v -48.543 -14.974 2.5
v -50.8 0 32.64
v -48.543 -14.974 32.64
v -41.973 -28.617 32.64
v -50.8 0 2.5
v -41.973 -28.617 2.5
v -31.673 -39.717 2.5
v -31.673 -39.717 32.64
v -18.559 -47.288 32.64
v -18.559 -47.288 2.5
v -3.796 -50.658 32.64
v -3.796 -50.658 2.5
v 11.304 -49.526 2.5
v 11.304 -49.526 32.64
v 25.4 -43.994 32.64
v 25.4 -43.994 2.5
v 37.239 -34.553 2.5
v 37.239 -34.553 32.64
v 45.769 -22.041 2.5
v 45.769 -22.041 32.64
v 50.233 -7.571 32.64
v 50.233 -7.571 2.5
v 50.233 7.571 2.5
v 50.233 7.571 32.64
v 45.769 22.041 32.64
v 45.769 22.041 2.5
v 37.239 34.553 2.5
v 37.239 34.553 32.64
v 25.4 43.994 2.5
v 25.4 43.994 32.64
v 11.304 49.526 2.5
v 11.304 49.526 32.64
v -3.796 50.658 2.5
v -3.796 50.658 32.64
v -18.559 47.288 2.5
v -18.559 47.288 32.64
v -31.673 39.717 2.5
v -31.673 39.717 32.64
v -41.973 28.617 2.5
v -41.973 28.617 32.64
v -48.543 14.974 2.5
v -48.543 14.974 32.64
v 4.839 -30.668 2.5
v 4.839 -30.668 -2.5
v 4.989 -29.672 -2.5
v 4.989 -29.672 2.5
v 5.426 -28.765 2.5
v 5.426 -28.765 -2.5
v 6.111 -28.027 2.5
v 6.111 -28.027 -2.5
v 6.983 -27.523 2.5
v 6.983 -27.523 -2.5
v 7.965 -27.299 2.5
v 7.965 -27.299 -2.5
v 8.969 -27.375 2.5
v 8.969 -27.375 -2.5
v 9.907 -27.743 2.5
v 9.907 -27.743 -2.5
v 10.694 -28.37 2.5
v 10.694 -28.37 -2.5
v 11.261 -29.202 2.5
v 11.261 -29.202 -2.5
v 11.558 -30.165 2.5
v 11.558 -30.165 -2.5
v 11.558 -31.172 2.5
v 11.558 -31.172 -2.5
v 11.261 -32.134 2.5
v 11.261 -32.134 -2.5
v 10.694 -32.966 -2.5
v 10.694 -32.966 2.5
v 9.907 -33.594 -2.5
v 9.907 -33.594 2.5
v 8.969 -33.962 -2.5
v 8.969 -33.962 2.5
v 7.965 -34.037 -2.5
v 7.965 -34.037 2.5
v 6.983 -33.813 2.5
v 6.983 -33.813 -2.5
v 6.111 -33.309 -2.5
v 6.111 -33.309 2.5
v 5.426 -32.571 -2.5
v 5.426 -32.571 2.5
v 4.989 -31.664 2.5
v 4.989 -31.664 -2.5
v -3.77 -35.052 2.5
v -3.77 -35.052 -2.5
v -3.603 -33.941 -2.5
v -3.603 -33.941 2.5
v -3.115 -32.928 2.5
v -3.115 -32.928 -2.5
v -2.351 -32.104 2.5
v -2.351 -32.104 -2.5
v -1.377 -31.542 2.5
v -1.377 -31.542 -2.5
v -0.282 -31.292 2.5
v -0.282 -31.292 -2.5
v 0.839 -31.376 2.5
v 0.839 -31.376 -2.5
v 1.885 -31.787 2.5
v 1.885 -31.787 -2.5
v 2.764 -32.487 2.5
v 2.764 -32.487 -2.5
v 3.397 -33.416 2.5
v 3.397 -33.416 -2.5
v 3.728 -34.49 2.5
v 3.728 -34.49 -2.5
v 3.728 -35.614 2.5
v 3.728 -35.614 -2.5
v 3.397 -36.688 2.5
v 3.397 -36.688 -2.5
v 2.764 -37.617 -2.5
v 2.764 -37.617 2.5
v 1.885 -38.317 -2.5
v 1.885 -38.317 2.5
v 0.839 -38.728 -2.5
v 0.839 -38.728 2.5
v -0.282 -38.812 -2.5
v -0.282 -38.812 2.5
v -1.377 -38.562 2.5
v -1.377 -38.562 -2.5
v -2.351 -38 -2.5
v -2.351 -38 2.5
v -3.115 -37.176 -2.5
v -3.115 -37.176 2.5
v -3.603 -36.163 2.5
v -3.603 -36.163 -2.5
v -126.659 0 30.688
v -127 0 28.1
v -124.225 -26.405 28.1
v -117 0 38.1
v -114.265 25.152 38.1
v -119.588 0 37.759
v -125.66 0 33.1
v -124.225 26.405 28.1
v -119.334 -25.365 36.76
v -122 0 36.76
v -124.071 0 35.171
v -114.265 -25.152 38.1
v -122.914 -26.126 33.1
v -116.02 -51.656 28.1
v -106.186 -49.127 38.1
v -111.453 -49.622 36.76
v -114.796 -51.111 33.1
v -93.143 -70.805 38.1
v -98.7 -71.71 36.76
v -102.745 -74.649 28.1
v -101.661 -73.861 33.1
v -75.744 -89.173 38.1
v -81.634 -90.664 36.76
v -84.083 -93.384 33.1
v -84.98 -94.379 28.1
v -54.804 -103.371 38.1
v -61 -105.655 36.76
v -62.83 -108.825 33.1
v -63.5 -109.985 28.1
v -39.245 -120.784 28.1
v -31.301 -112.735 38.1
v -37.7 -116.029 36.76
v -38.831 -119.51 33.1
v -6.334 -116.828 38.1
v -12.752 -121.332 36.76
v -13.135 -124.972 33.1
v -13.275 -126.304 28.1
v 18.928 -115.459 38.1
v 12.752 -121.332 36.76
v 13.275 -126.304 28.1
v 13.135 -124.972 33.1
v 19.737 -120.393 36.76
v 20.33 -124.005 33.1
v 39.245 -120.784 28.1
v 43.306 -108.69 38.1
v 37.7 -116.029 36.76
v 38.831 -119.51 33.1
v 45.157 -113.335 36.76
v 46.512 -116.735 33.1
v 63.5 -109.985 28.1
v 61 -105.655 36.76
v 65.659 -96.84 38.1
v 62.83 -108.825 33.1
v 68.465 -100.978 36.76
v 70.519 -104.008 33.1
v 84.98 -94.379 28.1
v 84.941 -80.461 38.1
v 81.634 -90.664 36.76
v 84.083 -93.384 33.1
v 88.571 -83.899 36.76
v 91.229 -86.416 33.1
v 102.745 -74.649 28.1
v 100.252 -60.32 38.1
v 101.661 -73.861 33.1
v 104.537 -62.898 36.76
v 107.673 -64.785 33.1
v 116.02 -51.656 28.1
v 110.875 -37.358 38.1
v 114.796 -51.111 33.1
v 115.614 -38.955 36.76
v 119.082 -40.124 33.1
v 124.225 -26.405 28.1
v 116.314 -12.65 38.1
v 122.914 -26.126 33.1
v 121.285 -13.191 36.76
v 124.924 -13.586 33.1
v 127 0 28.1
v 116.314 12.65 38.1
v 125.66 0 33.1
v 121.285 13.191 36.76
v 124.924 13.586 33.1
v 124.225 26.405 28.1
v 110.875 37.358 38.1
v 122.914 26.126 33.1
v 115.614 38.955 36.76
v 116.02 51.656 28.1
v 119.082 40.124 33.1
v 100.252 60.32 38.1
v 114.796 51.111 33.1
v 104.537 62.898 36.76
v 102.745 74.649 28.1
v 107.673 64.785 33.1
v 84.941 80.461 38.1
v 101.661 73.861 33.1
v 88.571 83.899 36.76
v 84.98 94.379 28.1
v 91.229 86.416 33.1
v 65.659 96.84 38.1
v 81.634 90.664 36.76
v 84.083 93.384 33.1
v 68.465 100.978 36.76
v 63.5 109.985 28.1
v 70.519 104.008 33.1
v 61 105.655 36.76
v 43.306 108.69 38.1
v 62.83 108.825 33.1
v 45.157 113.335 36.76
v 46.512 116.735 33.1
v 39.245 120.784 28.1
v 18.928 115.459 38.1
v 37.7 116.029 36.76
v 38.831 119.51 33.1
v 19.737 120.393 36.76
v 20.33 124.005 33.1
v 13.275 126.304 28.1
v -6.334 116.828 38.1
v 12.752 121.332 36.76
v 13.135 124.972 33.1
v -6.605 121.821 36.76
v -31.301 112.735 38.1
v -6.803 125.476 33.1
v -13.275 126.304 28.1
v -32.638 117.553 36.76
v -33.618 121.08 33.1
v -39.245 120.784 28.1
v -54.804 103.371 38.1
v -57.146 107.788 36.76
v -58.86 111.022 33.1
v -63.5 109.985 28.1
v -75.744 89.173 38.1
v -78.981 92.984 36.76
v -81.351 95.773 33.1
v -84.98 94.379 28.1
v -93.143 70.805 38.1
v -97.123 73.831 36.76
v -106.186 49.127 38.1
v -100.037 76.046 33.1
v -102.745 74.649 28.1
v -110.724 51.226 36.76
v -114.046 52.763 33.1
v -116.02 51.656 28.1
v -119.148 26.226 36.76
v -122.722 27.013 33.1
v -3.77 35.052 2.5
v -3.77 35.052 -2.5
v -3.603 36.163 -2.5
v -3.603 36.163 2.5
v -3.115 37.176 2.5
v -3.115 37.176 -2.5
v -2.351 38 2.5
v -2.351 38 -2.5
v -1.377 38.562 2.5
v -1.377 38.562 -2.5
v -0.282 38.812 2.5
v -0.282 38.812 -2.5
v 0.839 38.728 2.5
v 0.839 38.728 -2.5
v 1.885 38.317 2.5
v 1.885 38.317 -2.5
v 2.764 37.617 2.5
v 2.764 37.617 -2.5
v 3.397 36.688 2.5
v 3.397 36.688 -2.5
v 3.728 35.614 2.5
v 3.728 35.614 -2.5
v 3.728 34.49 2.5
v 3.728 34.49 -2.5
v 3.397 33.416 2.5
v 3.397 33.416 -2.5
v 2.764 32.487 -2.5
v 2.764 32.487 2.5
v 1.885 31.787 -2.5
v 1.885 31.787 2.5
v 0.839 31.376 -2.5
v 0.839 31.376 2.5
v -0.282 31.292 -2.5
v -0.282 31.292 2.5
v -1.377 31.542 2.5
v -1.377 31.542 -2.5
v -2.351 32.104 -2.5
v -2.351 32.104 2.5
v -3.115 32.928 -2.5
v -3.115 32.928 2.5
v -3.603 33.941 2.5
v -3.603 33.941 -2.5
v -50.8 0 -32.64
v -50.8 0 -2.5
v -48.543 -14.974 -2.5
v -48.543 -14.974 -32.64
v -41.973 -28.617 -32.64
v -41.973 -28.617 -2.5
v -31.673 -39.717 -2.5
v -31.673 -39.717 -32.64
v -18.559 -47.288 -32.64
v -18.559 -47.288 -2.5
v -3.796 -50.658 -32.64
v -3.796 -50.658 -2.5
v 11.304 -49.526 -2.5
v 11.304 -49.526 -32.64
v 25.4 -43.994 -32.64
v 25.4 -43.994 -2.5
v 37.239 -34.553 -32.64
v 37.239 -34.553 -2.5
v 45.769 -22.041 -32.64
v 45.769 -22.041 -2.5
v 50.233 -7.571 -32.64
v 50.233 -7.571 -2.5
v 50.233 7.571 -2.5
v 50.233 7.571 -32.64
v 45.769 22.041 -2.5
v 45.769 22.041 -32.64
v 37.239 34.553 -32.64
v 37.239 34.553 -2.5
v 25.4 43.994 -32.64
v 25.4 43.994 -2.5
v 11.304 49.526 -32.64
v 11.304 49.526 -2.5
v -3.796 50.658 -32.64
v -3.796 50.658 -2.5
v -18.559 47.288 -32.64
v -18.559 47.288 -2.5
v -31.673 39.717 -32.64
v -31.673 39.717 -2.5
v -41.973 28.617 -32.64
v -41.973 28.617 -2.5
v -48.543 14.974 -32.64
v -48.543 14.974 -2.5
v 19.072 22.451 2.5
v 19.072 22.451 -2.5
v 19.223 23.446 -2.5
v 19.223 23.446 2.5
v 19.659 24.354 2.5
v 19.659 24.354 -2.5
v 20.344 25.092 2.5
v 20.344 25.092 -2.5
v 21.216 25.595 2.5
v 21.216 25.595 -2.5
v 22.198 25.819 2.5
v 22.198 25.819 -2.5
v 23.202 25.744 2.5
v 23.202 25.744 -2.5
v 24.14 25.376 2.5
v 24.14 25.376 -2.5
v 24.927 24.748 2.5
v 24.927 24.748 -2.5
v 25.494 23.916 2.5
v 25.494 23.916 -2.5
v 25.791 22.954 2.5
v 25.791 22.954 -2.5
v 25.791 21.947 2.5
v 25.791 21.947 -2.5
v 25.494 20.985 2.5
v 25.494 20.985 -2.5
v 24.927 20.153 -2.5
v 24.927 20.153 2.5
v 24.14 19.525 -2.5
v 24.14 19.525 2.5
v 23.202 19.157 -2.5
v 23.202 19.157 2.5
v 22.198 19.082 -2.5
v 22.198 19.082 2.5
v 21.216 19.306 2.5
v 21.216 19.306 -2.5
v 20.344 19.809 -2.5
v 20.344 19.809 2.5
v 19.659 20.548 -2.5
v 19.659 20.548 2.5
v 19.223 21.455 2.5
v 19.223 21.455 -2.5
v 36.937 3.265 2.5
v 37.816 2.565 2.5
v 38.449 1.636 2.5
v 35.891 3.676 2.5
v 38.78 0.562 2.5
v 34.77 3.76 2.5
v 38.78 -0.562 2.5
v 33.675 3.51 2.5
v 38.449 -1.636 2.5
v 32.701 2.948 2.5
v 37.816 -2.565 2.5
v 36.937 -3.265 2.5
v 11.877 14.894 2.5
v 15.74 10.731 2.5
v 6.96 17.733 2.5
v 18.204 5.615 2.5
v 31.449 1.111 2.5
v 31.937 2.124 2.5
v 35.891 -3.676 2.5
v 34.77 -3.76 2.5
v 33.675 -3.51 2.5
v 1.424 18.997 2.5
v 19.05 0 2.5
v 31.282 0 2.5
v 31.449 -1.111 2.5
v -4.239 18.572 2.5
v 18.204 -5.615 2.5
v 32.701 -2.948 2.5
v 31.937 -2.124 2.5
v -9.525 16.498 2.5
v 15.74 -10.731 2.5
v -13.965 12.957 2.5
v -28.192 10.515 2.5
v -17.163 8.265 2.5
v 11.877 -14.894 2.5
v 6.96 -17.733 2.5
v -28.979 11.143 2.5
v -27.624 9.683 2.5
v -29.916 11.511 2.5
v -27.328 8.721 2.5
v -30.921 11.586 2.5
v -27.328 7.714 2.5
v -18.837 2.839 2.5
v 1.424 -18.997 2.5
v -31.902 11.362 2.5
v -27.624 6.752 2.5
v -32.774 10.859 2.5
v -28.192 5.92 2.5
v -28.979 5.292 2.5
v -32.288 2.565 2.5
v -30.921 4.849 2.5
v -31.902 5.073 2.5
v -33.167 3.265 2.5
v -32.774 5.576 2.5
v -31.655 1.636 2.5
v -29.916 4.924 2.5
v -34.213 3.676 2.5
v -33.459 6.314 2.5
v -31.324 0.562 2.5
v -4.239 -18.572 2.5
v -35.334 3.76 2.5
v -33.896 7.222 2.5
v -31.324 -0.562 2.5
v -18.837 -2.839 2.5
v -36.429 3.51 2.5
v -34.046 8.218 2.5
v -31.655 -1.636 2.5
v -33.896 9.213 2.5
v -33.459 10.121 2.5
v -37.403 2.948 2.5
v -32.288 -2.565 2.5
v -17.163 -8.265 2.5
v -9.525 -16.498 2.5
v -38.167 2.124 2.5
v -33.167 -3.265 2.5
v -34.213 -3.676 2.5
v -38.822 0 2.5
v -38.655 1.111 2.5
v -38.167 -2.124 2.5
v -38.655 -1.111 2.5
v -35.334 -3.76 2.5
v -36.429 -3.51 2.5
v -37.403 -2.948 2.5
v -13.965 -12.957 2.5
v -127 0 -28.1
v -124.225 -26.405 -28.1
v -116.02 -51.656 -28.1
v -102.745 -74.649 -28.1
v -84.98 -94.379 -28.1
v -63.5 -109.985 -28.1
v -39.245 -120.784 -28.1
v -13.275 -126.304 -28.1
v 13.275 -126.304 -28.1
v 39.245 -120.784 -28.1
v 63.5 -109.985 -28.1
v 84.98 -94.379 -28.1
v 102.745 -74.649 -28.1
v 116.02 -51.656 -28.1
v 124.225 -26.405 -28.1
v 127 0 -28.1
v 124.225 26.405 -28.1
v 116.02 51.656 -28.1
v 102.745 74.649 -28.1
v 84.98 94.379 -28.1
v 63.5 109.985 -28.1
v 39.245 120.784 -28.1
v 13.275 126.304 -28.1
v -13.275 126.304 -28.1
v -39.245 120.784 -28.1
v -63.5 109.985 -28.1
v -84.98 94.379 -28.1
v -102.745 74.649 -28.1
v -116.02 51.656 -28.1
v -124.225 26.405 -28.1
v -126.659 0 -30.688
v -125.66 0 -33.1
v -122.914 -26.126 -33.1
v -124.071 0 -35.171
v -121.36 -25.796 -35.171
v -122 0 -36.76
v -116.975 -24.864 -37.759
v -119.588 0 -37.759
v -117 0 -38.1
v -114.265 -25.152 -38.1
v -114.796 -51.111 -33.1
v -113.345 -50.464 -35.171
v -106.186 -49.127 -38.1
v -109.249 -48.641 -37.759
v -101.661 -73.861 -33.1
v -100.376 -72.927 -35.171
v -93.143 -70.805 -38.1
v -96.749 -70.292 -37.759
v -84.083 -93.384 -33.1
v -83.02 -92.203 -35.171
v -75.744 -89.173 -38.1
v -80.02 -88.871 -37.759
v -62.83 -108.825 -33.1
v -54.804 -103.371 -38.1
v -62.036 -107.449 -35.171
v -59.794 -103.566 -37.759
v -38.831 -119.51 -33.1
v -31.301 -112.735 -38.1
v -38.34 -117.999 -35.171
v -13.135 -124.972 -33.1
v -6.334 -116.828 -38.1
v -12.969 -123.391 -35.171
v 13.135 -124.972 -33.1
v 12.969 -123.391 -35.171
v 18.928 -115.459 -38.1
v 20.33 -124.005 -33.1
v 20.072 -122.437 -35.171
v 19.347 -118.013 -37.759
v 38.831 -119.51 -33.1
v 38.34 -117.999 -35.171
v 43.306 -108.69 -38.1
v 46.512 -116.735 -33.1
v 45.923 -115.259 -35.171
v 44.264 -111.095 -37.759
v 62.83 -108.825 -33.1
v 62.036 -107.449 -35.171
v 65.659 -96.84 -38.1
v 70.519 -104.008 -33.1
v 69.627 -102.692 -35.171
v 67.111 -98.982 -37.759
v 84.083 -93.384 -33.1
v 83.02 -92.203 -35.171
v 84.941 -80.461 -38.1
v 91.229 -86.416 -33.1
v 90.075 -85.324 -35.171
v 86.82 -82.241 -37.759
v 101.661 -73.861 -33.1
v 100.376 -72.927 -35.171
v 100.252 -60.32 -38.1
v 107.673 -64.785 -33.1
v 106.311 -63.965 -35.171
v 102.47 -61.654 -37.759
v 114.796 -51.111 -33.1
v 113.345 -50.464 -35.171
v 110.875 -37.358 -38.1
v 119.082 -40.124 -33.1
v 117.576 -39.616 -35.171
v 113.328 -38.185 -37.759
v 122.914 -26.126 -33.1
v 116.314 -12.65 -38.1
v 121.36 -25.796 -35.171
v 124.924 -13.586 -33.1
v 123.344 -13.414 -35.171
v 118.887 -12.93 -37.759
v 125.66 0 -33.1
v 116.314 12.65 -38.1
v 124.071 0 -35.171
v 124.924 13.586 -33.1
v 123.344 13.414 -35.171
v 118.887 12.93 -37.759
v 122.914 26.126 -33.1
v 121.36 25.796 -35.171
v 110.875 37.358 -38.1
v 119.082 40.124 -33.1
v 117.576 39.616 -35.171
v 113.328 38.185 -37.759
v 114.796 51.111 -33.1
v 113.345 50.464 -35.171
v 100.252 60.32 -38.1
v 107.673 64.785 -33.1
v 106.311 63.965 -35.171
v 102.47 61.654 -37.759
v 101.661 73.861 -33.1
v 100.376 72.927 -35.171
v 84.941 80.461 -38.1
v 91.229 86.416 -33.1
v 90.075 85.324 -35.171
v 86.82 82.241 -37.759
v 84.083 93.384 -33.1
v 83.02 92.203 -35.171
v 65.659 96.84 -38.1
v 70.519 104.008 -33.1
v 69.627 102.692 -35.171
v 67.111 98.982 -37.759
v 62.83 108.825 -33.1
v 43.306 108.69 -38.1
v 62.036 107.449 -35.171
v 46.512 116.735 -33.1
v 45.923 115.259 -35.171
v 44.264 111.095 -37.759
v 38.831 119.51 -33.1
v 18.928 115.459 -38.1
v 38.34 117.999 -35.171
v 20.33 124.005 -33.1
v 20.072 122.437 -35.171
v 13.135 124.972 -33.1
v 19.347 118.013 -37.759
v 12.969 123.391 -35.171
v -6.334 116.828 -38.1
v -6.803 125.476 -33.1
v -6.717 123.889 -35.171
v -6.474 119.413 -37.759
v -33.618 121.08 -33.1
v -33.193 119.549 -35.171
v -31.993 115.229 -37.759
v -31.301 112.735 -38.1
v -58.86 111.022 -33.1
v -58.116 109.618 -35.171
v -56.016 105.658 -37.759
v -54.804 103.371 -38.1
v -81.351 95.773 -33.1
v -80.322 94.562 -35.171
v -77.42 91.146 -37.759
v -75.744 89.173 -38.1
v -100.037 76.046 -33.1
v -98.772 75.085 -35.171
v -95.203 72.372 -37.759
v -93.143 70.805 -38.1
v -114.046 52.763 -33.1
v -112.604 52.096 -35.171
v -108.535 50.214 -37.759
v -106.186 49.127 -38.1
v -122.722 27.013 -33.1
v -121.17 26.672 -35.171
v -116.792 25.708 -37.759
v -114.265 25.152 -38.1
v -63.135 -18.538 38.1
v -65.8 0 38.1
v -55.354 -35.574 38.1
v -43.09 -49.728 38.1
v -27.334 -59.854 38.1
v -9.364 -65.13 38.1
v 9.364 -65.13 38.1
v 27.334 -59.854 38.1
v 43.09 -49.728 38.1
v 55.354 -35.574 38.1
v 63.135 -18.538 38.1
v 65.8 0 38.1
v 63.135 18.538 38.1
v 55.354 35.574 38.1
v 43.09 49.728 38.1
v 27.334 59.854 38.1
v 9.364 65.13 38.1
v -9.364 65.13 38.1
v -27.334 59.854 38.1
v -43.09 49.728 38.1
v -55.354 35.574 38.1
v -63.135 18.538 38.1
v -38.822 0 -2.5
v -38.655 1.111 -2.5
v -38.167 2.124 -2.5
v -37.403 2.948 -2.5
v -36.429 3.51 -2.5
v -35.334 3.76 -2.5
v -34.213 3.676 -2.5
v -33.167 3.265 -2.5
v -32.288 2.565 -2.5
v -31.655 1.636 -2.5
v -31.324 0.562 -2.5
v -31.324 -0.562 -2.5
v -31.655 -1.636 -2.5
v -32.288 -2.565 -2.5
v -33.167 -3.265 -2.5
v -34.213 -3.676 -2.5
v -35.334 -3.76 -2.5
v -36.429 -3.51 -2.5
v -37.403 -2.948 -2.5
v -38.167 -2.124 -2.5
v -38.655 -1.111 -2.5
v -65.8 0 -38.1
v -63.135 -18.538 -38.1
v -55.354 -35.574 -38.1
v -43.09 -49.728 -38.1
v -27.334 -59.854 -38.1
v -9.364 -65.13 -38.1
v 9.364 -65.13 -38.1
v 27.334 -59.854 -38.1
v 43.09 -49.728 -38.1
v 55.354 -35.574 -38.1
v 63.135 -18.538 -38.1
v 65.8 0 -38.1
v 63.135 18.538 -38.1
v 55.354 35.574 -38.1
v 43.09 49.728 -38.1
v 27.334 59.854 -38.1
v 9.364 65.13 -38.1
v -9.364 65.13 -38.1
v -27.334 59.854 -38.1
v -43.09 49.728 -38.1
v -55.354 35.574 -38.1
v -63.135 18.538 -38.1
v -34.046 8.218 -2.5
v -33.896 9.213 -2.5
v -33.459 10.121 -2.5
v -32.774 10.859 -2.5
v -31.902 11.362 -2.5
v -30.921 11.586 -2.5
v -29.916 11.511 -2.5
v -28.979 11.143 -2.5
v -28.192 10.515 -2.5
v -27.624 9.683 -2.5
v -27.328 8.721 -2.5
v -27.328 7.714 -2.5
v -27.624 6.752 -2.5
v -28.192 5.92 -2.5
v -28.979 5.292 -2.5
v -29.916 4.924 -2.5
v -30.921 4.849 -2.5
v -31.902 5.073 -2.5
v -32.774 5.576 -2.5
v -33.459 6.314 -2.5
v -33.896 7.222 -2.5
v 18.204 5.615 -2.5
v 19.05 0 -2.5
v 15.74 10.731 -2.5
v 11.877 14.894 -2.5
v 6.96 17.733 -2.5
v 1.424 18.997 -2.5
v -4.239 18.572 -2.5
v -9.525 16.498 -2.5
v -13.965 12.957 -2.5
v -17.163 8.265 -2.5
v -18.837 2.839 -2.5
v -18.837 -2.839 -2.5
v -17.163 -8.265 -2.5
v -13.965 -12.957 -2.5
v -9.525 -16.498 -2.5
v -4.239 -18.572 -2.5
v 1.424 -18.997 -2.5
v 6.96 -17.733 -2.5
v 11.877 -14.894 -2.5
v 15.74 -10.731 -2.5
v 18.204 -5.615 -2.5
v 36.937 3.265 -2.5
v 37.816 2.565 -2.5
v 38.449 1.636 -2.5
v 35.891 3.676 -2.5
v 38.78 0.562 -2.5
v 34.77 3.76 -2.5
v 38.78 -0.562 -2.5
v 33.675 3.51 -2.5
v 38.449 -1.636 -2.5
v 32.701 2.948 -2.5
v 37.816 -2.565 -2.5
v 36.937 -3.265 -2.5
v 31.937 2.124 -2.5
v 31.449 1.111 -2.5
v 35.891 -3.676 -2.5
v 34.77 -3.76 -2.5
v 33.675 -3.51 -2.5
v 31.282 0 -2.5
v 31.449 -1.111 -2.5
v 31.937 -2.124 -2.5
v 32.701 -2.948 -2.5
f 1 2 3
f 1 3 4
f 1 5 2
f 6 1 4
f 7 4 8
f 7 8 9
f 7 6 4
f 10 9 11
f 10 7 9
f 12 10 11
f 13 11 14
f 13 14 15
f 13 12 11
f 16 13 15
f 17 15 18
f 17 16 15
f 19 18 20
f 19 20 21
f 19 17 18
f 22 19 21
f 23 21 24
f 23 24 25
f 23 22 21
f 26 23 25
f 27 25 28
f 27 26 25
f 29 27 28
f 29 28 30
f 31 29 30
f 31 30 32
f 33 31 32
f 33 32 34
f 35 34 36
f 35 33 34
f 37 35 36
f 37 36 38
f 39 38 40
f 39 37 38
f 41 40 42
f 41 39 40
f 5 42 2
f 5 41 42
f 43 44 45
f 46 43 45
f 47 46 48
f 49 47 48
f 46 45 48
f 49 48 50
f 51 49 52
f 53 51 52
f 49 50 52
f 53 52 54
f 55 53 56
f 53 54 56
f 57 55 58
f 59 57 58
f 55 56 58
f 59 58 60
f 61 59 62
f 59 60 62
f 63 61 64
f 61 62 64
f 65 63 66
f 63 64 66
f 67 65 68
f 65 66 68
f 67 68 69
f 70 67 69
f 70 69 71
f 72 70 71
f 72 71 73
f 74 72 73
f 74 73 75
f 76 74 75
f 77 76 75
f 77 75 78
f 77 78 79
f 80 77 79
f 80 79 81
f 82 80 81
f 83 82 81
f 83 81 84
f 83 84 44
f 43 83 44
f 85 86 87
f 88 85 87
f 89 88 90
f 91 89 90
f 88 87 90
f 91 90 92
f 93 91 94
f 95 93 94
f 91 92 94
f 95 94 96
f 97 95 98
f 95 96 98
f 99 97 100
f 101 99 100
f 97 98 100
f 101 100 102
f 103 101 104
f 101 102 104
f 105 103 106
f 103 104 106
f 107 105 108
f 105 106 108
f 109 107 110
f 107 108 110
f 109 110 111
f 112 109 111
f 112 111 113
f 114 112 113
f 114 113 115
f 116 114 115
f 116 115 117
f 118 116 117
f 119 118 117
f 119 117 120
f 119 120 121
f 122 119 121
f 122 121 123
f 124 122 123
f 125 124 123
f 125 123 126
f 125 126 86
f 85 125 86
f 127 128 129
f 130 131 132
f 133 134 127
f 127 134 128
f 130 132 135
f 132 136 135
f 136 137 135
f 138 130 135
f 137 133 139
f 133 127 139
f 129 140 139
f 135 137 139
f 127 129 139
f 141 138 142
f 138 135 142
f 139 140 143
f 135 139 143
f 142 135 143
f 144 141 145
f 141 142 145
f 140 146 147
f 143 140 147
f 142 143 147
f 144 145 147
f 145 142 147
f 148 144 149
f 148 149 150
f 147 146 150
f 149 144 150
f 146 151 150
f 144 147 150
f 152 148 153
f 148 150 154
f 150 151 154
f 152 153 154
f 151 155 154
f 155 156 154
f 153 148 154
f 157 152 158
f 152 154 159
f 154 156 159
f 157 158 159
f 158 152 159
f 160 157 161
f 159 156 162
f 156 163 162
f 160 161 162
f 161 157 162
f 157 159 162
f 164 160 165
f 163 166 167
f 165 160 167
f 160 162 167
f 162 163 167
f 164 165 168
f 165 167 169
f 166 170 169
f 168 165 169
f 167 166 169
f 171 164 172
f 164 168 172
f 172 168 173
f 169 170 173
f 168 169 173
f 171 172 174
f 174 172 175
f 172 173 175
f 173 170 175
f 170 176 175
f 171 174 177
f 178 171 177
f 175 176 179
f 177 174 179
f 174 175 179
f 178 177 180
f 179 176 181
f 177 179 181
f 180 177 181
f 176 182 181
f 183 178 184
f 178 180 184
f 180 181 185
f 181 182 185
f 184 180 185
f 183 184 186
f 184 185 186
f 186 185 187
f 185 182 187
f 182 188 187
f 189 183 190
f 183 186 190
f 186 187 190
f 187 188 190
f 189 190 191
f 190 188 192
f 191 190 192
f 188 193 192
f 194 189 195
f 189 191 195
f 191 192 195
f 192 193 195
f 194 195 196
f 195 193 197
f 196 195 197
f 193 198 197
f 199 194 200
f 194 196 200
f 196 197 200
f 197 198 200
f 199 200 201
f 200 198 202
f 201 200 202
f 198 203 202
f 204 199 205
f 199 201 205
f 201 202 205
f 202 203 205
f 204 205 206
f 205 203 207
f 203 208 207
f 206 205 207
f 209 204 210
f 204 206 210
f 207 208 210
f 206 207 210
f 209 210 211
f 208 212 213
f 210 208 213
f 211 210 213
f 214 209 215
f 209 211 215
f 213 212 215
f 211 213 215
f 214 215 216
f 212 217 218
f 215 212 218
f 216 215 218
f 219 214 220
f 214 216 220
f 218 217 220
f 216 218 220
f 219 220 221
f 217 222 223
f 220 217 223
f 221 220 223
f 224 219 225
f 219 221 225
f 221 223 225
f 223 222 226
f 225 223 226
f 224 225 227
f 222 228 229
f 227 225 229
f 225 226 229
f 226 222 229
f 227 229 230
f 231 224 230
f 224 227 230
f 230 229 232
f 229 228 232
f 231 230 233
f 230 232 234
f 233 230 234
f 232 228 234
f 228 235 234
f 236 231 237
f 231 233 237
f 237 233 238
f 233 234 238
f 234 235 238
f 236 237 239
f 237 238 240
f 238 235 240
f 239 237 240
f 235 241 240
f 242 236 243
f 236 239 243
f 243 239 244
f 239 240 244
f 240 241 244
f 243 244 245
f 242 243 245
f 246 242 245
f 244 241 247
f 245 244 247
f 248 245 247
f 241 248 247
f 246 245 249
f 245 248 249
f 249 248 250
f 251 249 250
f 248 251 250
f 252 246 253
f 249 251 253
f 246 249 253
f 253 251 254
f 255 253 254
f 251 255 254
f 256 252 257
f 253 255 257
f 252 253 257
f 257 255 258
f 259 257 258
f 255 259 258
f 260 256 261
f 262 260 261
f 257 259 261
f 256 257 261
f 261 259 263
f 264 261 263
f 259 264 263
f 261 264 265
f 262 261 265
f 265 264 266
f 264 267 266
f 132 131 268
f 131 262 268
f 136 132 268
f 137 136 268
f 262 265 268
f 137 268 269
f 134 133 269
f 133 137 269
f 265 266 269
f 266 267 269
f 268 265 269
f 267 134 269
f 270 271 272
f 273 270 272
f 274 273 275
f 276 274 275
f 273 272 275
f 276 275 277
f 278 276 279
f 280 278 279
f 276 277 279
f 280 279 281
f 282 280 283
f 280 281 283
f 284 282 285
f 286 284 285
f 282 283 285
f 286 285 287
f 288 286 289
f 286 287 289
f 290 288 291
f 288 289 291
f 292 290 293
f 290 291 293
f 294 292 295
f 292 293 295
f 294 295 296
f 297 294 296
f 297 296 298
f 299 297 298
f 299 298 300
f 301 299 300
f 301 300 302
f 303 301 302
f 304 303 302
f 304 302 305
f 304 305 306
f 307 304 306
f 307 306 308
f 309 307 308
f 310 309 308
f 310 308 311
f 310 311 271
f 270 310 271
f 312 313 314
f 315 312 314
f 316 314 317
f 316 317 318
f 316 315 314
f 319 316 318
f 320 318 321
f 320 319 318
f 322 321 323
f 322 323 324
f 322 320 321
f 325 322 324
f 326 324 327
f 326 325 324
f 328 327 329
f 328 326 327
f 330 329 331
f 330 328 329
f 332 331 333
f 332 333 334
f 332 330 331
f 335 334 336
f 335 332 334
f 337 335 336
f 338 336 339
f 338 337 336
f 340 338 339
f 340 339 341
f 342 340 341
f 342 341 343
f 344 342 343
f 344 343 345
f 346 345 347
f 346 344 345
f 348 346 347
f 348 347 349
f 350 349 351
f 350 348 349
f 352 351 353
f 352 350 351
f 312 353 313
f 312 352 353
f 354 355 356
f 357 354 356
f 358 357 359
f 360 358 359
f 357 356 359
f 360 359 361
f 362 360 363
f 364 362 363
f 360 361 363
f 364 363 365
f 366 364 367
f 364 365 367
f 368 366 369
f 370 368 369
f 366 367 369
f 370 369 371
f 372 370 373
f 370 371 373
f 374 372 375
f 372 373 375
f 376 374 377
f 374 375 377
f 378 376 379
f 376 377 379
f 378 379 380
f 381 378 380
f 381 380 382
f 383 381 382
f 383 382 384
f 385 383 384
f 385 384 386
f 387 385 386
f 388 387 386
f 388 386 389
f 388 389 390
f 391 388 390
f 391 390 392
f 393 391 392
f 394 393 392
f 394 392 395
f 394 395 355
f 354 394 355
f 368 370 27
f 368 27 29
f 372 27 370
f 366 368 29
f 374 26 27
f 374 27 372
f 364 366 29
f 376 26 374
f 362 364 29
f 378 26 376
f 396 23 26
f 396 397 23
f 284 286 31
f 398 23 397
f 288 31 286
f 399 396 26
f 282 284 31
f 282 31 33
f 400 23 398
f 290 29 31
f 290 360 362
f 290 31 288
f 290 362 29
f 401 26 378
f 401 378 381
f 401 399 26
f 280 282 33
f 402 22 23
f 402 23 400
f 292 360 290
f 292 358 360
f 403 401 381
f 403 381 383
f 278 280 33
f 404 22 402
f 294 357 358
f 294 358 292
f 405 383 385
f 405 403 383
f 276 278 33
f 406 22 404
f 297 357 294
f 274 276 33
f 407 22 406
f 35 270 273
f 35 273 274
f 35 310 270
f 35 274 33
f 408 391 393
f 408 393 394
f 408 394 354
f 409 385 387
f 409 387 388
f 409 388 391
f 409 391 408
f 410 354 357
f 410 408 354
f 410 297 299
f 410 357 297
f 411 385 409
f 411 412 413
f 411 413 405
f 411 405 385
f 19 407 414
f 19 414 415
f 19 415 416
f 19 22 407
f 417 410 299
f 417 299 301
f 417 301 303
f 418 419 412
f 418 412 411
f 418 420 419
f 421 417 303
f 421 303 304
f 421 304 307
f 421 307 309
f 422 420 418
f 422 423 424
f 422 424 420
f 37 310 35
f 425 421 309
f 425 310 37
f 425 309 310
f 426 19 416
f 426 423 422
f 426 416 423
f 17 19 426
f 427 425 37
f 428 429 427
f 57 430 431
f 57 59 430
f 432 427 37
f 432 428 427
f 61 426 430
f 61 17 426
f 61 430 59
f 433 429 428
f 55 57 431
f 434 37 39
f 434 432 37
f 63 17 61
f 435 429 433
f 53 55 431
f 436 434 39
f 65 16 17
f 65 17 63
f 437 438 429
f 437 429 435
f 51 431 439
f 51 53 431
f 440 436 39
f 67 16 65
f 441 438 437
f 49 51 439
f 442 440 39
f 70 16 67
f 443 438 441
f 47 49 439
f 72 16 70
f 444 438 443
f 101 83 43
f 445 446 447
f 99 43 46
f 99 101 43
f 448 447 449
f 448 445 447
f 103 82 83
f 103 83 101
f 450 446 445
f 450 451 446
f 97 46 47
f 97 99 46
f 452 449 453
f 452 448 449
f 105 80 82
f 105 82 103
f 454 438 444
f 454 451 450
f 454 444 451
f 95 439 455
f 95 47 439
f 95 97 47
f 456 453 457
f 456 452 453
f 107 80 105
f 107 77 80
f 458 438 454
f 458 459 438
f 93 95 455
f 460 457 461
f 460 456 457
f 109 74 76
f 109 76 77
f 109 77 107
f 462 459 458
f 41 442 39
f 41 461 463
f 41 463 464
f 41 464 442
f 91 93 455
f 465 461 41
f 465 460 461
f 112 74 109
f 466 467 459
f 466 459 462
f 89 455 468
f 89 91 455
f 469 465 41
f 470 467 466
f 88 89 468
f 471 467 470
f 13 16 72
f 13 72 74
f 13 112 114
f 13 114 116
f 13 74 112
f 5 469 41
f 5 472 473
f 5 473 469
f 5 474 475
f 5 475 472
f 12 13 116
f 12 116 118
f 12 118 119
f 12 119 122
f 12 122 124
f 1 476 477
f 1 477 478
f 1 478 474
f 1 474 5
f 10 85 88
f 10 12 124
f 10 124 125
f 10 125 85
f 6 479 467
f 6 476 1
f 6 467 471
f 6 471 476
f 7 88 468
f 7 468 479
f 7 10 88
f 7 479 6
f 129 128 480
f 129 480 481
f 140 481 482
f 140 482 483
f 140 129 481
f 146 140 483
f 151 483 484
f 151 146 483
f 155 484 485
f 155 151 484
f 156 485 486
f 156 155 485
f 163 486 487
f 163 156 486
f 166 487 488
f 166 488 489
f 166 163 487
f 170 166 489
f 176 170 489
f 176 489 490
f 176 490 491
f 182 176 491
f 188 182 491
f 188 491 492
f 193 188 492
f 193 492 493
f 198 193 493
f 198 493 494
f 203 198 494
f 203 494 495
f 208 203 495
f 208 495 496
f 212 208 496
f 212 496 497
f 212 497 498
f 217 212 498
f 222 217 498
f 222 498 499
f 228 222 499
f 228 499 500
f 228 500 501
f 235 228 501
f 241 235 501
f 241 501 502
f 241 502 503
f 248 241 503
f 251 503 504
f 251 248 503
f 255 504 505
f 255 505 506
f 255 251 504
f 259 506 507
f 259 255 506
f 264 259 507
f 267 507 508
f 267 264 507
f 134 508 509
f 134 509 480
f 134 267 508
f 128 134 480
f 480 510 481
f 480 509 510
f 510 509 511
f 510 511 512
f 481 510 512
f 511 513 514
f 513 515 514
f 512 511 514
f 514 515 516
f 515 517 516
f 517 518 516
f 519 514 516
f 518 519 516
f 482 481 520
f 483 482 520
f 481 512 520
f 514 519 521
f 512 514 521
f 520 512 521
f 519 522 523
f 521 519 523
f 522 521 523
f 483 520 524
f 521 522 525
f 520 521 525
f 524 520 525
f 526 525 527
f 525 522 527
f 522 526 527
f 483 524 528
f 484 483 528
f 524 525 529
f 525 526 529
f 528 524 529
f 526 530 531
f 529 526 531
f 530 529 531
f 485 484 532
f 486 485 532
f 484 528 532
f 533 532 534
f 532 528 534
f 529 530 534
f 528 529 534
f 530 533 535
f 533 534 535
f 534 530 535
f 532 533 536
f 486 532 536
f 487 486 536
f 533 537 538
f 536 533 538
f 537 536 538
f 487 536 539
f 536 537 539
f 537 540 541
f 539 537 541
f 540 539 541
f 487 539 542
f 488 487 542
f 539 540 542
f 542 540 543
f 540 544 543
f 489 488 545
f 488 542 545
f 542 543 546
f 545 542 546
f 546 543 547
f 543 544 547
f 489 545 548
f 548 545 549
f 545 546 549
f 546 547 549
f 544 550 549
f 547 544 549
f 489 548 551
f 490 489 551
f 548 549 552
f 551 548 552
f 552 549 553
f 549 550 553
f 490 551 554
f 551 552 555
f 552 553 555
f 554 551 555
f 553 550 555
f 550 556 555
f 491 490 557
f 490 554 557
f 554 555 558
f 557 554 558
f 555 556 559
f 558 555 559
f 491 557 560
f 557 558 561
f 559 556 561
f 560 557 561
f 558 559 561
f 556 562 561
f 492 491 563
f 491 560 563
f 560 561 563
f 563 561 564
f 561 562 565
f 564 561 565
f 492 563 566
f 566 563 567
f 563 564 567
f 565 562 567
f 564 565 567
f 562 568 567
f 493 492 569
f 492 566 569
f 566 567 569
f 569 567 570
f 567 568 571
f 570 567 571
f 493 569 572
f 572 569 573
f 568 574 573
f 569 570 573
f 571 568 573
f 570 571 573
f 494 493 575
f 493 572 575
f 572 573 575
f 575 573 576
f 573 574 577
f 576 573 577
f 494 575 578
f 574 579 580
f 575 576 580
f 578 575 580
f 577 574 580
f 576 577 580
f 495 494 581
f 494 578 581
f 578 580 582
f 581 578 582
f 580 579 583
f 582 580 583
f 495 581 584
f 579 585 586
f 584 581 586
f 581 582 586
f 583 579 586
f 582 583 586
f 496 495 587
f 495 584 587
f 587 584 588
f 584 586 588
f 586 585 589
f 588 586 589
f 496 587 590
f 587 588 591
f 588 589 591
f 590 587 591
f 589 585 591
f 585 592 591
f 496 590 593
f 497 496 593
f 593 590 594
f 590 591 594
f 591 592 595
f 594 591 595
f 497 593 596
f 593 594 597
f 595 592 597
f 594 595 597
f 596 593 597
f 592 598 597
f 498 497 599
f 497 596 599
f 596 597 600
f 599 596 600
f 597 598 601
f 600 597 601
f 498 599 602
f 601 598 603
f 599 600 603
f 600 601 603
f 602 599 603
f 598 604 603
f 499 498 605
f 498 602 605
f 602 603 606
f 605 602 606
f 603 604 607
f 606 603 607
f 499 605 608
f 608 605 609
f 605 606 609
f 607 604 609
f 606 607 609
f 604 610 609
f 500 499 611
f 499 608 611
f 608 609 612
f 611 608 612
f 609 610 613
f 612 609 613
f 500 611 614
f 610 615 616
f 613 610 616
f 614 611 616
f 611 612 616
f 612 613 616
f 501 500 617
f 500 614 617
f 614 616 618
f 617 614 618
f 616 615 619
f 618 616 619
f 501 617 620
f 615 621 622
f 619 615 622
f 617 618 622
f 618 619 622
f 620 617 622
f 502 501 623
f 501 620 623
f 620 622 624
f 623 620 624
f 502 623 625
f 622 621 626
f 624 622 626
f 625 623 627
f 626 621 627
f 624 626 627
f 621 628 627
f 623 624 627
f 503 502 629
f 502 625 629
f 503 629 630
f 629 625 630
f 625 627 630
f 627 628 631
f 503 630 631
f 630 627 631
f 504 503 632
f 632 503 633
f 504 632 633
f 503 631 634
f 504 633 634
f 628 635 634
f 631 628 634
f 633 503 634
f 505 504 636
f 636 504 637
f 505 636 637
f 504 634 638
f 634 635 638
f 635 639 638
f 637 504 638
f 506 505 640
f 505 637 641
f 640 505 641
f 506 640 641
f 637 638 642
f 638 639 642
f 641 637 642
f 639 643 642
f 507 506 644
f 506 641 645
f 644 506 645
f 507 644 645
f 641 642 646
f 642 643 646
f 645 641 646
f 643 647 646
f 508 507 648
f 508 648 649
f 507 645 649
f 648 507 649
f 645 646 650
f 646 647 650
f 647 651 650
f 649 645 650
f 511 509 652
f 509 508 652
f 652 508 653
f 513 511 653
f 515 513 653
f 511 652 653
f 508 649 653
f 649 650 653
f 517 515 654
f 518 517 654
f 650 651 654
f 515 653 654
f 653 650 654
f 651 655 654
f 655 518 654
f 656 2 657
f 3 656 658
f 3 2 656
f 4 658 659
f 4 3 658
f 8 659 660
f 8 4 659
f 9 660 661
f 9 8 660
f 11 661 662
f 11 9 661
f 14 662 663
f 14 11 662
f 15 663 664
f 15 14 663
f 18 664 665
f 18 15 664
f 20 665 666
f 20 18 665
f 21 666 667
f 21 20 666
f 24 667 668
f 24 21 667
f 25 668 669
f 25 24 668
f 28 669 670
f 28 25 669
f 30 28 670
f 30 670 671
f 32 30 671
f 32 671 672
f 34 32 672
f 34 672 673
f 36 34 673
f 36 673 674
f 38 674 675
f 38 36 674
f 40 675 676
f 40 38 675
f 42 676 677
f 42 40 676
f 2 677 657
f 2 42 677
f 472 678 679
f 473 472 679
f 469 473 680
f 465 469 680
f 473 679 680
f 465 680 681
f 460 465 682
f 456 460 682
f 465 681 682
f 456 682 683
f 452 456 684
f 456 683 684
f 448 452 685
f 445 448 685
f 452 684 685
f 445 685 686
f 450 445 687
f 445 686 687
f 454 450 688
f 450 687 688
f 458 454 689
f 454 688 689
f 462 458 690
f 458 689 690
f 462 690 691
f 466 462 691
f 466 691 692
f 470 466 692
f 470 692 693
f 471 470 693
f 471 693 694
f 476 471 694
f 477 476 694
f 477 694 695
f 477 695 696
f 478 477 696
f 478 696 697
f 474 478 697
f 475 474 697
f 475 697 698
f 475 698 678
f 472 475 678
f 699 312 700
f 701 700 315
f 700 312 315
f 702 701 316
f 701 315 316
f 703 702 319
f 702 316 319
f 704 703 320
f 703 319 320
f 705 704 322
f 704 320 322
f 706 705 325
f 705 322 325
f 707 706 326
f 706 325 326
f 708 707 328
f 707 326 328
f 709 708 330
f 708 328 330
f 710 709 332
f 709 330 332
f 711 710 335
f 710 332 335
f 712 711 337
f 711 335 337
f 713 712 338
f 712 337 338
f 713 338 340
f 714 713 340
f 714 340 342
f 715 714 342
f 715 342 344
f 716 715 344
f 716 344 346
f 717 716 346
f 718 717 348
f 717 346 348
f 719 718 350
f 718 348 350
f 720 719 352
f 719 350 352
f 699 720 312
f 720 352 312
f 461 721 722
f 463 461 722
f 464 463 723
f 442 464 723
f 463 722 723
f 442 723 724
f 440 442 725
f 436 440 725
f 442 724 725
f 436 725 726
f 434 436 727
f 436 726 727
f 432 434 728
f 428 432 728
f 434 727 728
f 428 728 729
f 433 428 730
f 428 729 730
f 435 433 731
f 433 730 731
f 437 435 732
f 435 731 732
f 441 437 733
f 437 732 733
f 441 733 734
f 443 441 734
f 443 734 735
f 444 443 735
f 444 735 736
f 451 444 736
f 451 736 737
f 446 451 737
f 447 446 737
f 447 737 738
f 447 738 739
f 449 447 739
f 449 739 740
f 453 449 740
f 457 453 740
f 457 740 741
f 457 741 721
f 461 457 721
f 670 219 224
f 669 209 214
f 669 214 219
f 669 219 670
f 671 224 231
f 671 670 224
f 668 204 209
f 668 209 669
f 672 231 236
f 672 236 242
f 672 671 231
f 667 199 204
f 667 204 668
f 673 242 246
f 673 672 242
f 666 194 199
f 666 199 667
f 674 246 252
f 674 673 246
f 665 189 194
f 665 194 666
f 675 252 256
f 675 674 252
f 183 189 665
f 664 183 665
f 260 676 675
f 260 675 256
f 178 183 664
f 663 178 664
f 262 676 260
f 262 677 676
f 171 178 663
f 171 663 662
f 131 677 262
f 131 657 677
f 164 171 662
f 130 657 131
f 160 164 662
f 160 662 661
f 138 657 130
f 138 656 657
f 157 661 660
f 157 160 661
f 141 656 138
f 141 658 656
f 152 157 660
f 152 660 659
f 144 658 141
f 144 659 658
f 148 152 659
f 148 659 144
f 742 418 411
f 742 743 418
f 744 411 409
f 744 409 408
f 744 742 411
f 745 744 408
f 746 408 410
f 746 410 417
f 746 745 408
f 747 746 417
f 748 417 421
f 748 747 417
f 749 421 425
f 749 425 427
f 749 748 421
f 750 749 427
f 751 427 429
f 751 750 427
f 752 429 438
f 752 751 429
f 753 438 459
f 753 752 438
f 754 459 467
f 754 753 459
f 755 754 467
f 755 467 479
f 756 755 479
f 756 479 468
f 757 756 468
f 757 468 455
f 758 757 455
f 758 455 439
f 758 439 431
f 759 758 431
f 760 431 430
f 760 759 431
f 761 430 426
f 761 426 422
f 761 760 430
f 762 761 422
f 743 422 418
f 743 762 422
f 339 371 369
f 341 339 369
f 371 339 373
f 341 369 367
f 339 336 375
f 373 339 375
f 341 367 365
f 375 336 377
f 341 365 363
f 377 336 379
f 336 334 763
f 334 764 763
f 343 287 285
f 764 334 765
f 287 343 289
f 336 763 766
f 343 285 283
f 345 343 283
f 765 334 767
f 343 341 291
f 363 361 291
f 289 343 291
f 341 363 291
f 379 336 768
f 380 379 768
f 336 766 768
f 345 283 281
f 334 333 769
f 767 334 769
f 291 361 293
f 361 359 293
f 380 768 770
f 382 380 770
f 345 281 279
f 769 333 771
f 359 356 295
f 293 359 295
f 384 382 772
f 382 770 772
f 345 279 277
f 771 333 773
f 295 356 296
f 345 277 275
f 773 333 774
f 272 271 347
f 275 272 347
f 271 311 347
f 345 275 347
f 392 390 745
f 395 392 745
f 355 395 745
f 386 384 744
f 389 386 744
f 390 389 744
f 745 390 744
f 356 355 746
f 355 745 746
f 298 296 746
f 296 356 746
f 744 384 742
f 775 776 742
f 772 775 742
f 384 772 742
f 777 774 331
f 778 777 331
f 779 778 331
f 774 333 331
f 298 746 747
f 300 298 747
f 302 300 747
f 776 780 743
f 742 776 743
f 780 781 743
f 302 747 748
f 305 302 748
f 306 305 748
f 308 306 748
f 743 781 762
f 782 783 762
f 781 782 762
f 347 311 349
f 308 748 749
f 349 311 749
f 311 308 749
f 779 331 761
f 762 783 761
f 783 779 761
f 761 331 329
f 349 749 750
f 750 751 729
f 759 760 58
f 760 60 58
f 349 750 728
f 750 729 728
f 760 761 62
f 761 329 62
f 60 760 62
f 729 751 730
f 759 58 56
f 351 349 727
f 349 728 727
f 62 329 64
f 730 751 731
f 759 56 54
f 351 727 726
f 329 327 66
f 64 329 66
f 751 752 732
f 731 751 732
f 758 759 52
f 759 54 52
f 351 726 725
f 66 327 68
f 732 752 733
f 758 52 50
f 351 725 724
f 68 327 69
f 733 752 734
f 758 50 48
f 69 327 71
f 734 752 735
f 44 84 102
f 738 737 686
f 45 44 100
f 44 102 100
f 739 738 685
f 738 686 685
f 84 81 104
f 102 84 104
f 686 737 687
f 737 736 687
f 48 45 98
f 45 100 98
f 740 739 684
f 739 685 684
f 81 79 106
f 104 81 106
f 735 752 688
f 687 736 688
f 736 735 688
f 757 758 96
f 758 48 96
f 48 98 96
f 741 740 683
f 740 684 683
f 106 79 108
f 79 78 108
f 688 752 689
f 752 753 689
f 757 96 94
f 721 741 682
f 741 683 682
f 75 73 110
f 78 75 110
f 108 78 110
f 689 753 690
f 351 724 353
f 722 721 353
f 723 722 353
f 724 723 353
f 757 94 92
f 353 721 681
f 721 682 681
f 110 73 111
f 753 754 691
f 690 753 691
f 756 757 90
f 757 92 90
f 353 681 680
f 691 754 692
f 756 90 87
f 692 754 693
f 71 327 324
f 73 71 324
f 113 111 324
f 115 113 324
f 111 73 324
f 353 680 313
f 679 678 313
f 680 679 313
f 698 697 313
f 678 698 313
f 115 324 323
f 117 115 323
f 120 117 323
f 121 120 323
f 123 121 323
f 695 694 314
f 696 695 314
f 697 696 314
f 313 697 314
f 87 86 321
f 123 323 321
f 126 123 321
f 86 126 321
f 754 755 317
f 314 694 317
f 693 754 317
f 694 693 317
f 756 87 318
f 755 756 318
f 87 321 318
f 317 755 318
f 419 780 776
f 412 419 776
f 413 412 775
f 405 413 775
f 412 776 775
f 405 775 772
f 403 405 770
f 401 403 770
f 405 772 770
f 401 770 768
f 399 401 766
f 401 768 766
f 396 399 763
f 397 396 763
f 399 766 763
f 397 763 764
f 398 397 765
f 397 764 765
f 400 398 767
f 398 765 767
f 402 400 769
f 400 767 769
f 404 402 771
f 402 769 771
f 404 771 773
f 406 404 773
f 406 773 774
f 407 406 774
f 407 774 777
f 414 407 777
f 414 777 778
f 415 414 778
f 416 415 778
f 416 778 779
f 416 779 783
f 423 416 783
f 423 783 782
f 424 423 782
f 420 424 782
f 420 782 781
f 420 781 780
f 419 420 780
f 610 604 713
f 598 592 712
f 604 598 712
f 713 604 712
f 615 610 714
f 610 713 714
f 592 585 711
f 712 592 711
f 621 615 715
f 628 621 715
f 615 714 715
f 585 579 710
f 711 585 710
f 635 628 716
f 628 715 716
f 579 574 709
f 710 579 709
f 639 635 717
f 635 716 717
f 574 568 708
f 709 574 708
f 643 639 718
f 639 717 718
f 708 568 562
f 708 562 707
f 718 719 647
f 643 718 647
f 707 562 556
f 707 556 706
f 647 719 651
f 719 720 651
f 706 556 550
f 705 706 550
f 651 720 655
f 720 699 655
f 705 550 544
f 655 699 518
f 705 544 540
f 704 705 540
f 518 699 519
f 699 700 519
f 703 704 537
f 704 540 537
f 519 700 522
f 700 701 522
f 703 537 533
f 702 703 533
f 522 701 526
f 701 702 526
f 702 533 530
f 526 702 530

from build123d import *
from OCP.BRepFilletAPI import BRepFilletAPI_MakeChamfer

# Parameters (mm, degrees)
SKETCH1_R                            = 127
SKETCH1_R_2                          = 50.8
BOSS_EXTRUDE1_DEPTH                  = 38.1
CHAMFER1_SIZE                        = 15
CHAMFER1_SIZE2                       = 5.459553514
FILLET1_R                            = 10
SKETCH2_R                            = 50.8
SKETCH2_R_2                          = 19.05
BOSS_EXTRUDE2_DEPTH                  = 2.5
F_19_64_0_29688_DIAMETER_HOLE1_D     = 7.540752
F_19_64_0_29688_DIAMETER_HOLE1_DEPTH = 18.75
F_19_64_0_29688_DIAMETER_HOLE1_TIP   = 2.265470457
F_1_4_CLEARANCE_HOLE1_D              = 6.7564
F_1_4_CLEARANCE_HOLE1_DEPTH          = 18.75
F_1_4_CLEARANCE_HOLE1_TIP            = 2.029827343


with BuildPart() as part:
    # Sketch1 → Boss-Extrude1 (new, symmetric)
    with BuildSketch(Plane.XY):
        with Locations(Location((0, 0, 0), (0, 0, 180))):
            Circle(SKETCH1_R)
        with Locations(Location((0, 0, 0), (0, 0, 180))):
            Circle(SKETCH1_R_2, mode=Mode.SUBTRACT)
    extrude(amount=BOSS_EXTRUDE1_DEPTH, both=True)

    # Chamfer1: one chamfer whose edges measure the first distance from different faces: ONE call of the kernel's chamfer builder (chamfer() names one face for all edges)
    chamfer1_edges_1 = [part.edges().sort_by_distance(p)[0] for p in [
        (50.8, 0, -38.1),
    ]]
    chamfer1_side_1 = [part.faces().sort_by_distance(p)[0] for p in [
        (123.407897552, 0, -38.1),
    ]]
    chamfer1_edges_2 = [part.edges().sort_by_distance(p)[0] for p in [
        (50.8, 0, 38.1),
    ]]
    chamfer1_side_2 = [part.faces().sort_by_distance(p)[0] for p in [
        (123.407897552, 0, 38.1),
    ]]
    chamfer1 = BRepFilletAPI_MakeChamfer(part.part.solid().wrapped)
    for e in chamfer1_edges_1:
        chamfer1.Add(CHAMFER1_SIZE, CHAMFER1_SIZE2, e.wrapped, chamfer1_side_1[0].wrapped)  # the first distance lies on this face
    for e in chamfer1_edges_2:
        chamfer1.Add(CHAMFER1_SIZE, CHAMFER1_SIZE2, e.wrapped, chamfer1_side_2[0].wrapped)  # the first distance lies on this face
    add(Compound.cast(chamfer1.Shape()), mode=Mode.REPLACE)

    # Fillet1
    fillet1_edges = [part.edges().sort_by_distance(p)[0] for p in [
        (127, 0, -38.1),
        (127, 0, 38.1),
    ]]
    fillet(fillet1_edges, radius=FILLET1_R)

    # Sketch2 → Boss-Extrude2 (add, symmetric)
    with BuildSketch(Plane.XY):
        with Locations(Location((0, 0, 0), (0, 0, 180))):
            Circle(SKETCH2_R)
        Circle(SKETCH2_R_2, mode=Mode.SUBTRACT)
    extrude(amount=BOSS_EXTRUDE2_DEPTH, both=True)

    # 19/64 (0.29688) Diameter Hole1
    with Locations(Plane.XY.offset(2.5)):
        with Locations((0, 35.052), (35.052, 0), (0, -35.052), (-35.052, 0)):
            Hole(F_19_64_0_29688_DIAMETER_HOLE1_D / 2, depth=F_19_64_0_29688_DIAMETER_HOLE1_DEPTH)
            with Locations((0, 0, -(F_19_64_0_29688_DIAMETER_HOLE1_DEPTH + F_19_64_0_29688_DIAMETER_HOLE1_TIP / 2))):  # 118° drill point
                Cone(0, F_19_64_0_29688_DIAMETER_HOLE1_D / 2, F_19_64_0_29688_DIAMETER_HOLE1_TIP, mode=Mode.SUBTRACT)

    # 1/4 Clearance Hole1
    with Locations(Plane.XY.offset(2.5)):
        with Locations((-30.668144985, 8.217504682), (22.450640303, 22.450640303), (8.217504682, -30.668144985)):
            Hole(F_1_4_CLEARANCE_HOLE1_D / 2, depth=F_1_4_CLEARANCE_HOLE1_DEPTH)
            with Locations((0, 0, -(F_1_4_CLEARANCE_HOLE1_DEPTH + F_1_4_CLEARANCE_HOLE1_TIP / 2))):  # 118° drill point
                Cone(0, F_1_4_CLEARANCE_HOLE1_D / 2, F_1_4_CLEARANCE_HOLE1_TIP, mode=Mode.SUBTRACT)


solid = part.part
